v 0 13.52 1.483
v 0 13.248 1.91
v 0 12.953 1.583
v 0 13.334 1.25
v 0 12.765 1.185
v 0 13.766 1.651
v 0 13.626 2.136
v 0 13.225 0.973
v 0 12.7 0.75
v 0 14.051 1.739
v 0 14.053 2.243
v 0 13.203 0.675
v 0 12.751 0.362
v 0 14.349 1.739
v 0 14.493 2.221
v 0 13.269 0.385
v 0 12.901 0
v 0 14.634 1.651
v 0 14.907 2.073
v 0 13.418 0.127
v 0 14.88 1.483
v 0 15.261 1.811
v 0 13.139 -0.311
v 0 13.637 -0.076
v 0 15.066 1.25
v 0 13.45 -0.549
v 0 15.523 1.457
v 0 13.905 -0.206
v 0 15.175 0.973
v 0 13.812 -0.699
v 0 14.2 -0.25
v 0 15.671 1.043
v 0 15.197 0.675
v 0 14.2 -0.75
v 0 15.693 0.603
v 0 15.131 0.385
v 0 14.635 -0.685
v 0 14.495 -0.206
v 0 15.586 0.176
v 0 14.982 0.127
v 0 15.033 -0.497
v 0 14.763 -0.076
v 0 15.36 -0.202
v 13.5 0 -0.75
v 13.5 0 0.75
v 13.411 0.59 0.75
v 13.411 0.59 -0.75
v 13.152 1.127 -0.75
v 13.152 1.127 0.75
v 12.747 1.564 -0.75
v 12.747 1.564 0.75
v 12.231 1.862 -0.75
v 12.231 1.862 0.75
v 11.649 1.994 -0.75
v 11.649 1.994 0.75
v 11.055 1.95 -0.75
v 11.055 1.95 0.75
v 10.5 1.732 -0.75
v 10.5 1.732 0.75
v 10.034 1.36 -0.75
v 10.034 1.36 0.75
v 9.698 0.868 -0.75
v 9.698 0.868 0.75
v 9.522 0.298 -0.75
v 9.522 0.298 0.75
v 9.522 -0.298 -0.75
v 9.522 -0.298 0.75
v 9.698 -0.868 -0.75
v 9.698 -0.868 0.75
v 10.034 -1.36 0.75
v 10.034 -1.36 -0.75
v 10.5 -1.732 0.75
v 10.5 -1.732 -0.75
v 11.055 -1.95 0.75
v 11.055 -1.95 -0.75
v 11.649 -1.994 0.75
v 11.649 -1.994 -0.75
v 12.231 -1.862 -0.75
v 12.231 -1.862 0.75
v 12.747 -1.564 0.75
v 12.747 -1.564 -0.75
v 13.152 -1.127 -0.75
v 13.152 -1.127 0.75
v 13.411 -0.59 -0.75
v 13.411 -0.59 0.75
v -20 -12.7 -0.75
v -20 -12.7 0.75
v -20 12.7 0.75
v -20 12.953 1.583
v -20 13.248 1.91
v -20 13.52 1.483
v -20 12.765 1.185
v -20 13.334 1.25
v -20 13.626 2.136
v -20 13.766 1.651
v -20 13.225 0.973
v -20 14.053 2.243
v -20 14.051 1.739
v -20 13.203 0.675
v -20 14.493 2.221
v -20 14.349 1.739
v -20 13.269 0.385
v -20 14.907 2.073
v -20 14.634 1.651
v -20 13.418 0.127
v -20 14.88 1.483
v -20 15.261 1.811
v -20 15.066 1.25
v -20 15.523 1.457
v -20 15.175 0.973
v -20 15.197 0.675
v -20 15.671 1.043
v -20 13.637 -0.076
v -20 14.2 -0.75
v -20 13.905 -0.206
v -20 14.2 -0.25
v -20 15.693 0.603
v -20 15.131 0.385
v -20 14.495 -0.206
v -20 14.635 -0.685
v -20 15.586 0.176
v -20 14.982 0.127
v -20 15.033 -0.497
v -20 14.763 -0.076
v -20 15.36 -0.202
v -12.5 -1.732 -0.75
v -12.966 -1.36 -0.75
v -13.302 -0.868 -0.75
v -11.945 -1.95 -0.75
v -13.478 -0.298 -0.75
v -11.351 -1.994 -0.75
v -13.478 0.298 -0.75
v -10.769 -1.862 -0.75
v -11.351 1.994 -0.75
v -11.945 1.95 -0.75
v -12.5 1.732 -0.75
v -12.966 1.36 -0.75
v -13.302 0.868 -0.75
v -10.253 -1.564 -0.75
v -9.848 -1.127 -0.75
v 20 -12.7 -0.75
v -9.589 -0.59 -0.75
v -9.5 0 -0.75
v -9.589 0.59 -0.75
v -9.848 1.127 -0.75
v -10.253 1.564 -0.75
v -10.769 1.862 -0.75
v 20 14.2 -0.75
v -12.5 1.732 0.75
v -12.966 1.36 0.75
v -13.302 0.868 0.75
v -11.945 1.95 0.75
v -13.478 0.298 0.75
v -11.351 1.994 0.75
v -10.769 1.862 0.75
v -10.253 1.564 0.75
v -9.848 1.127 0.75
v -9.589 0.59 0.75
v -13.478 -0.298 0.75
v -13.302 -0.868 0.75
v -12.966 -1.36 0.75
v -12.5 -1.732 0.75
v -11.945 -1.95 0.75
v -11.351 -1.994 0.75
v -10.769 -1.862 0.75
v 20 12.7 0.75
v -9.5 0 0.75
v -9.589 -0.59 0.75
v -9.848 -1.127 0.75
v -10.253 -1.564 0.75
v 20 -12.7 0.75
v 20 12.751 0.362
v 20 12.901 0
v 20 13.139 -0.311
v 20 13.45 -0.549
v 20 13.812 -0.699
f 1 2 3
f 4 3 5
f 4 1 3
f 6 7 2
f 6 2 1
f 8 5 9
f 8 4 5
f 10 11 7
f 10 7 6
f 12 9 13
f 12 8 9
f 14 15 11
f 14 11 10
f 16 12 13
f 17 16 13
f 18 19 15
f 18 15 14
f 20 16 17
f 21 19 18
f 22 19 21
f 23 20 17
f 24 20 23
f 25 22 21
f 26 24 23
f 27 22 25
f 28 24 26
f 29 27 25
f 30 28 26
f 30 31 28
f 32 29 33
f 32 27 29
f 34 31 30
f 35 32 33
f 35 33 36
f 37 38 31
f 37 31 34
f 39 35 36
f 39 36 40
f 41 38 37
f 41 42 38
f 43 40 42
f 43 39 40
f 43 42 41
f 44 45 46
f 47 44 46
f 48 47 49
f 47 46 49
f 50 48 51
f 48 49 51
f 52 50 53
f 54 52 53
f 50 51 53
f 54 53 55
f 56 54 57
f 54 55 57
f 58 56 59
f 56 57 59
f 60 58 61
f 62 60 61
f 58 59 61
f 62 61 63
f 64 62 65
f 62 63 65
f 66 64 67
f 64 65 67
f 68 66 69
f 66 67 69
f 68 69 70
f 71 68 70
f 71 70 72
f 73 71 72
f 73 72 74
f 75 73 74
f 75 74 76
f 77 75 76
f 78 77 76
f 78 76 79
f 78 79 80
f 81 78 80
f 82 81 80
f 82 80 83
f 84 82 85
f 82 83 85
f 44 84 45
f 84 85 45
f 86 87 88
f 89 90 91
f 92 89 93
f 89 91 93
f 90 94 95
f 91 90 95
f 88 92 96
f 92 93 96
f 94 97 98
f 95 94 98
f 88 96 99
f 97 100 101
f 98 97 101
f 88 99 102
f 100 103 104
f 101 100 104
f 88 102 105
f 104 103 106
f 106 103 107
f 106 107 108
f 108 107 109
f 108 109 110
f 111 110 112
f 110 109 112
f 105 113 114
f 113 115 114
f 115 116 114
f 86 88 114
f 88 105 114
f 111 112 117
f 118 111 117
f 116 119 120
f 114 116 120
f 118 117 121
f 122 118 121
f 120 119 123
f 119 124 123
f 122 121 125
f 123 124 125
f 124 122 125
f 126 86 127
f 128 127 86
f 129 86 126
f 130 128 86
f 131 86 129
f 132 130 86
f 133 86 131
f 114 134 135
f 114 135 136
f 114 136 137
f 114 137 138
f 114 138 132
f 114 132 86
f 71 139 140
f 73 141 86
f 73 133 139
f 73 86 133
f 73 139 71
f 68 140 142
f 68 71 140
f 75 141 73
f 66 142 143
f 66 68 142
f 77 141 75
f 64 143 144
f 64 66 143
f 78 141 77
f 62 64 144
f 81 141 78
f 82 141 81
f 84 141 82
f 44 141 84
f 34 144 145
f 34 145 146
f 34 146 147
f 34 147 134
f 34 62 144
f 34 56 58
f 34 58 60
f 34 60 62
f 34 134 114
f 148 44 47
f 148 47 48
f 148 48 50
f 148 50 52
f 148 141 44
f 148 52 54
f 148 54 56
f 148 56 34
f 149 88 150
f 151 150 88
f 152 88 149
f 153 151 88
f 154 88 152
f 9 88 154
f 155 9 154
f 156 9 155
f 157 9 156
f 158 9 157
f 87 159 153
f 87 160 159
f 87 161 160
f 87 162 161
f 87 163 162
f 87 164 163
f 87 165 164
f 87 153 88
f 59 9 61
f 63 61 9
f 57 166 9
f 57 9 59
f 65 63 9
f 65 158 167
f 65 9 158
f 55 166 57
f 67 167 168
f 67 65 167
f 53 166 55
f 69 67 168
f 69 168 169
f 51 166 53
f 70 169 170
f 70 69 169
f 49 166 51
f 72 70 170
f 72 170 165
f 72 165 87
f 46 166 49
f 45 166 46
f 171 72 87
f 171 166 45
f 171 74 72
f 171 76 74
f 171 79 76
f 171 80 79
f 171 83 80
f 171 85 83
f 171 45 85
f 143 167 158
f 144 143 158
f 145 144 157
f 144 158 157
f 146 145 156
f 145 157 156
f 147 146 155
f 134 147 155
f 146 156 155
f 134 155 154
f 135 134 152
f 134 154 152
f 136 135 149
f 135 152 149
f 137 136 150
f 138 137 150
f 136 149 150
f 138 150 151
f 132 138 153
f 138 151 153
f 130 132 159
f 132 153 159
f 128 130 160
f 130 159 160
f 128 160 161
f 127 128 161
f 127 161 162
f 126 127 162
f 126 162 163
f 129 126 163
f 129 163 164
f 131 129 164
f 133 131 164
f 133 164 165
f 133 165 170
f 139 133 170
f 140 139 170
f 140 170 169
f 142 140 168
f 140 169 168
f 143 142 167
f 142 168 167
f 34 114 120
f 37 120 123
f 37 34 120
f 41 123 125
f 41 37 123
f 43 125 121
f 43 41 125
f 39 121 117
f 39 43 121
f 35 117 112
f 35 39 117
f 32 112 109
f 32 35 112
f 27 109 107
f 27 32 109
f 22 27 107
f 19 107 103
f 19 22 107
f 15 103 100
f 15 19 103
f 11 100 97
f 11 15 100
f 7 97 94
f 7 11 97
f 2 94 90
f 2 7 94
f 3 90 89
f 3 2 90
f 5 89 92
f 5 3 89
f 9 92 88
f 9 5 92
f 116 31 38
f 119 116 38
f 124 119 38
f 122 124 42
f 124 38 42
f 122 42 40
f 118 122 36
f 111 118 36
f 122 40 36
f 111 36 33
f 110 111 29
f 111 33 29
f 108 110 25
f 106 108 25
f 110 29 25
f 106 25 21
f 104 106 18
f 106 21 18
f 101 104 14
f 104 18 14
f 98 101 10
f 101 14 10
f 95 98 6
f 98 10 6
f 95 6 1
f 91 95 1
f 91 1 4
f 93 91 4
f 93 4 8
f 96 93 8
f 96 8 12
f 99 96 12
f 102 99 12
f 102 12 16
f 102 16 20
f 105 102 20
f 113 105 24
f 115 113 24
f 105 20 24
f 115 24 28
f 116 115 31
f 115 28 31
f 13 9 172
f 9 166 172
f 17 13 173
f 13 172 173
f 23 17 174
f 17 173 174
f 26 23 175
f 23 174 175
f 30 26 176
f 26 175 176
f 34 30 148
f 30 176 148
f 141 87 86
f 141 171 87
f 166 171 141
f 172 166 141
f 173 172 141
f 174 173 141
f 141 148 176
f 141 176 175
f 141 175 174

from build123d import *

# Parameters (mm, degrees)
CROQUIS1_R                   = 1
SALIENTE_EXTRUIR1_DEPTH      = 20
SALIENTE_EXTRUIR1_DEPTH_BACK = 20
CROQUIS3_R                   = 1.5
CORTAR_EXTRUIR1_DEPTH        = 20
CROQUIS4_R                   = 2
CORTAR_EXTRUIR2_DEPTH        = 1.5


with BuildPart() as part:
    # Croquis1 → Saliente-Extruir1 (new body, two sides)
    with BuildSketch(Plane(origin=(0, 0, 0), x_dir=(0, 0, -1), z_dir=(1, 0, 0))) as saliente_extruir1_sk:
        with BuildLine():
            Line((-0.75, -12.7), (0.75, -12.7))
            Line((0.75, -12.7), (0.75, 12.7))
            Line((0.75, 12.7), (0.75, 14.2))
            ThreePointArc((0.75, 14.2), (-1.810660172, 15.260660172), (-0.75, 12.7))
            Line((-0.75, 12.7), (-0.75, -12.7))
        make_face()
        with Locations((-0.75, 14.2)):
            Circle(CROQUIS1_R, mode=Mode.SUBTRACT)
    extrude(amount=SALIENTE_EXTRUIR1_DEPTH)
    extrude(saliente_extruir1_sk.sketch, amount=-SALIENTE_EXTRUIR1_DEPTH_BACK)

    # Croquis3 → Cortar-Extruir1 (cut)
    with BuildSketch(Plane(origin=(20, 0, 0), x_dir=(0, 0, -1), z_dir=(1, 0, 0))):
        with Locations((-0.75, 14.2)):
            Circle(CROQUIS3_R)
    extrude(amount=-CORTAR_EXTRUIR1_DEPTH, mode=Mode.SUBTRACT)

    # Croquis4 → Cortar-Extruir2 (cut)
    with BuildSketch(Plane.XY.offset(0.75)):
        with Locations((-11.5, 0)):
            Circle(CROQUIS4_R)
        with Locations((11.5, 0)):
            Circle(CROQUIS4_R)
    extrude(amount=-CORTAR_EXTRUIR2_DEPTH, mode=Mode.SUBTRACT)


solid = part.part
